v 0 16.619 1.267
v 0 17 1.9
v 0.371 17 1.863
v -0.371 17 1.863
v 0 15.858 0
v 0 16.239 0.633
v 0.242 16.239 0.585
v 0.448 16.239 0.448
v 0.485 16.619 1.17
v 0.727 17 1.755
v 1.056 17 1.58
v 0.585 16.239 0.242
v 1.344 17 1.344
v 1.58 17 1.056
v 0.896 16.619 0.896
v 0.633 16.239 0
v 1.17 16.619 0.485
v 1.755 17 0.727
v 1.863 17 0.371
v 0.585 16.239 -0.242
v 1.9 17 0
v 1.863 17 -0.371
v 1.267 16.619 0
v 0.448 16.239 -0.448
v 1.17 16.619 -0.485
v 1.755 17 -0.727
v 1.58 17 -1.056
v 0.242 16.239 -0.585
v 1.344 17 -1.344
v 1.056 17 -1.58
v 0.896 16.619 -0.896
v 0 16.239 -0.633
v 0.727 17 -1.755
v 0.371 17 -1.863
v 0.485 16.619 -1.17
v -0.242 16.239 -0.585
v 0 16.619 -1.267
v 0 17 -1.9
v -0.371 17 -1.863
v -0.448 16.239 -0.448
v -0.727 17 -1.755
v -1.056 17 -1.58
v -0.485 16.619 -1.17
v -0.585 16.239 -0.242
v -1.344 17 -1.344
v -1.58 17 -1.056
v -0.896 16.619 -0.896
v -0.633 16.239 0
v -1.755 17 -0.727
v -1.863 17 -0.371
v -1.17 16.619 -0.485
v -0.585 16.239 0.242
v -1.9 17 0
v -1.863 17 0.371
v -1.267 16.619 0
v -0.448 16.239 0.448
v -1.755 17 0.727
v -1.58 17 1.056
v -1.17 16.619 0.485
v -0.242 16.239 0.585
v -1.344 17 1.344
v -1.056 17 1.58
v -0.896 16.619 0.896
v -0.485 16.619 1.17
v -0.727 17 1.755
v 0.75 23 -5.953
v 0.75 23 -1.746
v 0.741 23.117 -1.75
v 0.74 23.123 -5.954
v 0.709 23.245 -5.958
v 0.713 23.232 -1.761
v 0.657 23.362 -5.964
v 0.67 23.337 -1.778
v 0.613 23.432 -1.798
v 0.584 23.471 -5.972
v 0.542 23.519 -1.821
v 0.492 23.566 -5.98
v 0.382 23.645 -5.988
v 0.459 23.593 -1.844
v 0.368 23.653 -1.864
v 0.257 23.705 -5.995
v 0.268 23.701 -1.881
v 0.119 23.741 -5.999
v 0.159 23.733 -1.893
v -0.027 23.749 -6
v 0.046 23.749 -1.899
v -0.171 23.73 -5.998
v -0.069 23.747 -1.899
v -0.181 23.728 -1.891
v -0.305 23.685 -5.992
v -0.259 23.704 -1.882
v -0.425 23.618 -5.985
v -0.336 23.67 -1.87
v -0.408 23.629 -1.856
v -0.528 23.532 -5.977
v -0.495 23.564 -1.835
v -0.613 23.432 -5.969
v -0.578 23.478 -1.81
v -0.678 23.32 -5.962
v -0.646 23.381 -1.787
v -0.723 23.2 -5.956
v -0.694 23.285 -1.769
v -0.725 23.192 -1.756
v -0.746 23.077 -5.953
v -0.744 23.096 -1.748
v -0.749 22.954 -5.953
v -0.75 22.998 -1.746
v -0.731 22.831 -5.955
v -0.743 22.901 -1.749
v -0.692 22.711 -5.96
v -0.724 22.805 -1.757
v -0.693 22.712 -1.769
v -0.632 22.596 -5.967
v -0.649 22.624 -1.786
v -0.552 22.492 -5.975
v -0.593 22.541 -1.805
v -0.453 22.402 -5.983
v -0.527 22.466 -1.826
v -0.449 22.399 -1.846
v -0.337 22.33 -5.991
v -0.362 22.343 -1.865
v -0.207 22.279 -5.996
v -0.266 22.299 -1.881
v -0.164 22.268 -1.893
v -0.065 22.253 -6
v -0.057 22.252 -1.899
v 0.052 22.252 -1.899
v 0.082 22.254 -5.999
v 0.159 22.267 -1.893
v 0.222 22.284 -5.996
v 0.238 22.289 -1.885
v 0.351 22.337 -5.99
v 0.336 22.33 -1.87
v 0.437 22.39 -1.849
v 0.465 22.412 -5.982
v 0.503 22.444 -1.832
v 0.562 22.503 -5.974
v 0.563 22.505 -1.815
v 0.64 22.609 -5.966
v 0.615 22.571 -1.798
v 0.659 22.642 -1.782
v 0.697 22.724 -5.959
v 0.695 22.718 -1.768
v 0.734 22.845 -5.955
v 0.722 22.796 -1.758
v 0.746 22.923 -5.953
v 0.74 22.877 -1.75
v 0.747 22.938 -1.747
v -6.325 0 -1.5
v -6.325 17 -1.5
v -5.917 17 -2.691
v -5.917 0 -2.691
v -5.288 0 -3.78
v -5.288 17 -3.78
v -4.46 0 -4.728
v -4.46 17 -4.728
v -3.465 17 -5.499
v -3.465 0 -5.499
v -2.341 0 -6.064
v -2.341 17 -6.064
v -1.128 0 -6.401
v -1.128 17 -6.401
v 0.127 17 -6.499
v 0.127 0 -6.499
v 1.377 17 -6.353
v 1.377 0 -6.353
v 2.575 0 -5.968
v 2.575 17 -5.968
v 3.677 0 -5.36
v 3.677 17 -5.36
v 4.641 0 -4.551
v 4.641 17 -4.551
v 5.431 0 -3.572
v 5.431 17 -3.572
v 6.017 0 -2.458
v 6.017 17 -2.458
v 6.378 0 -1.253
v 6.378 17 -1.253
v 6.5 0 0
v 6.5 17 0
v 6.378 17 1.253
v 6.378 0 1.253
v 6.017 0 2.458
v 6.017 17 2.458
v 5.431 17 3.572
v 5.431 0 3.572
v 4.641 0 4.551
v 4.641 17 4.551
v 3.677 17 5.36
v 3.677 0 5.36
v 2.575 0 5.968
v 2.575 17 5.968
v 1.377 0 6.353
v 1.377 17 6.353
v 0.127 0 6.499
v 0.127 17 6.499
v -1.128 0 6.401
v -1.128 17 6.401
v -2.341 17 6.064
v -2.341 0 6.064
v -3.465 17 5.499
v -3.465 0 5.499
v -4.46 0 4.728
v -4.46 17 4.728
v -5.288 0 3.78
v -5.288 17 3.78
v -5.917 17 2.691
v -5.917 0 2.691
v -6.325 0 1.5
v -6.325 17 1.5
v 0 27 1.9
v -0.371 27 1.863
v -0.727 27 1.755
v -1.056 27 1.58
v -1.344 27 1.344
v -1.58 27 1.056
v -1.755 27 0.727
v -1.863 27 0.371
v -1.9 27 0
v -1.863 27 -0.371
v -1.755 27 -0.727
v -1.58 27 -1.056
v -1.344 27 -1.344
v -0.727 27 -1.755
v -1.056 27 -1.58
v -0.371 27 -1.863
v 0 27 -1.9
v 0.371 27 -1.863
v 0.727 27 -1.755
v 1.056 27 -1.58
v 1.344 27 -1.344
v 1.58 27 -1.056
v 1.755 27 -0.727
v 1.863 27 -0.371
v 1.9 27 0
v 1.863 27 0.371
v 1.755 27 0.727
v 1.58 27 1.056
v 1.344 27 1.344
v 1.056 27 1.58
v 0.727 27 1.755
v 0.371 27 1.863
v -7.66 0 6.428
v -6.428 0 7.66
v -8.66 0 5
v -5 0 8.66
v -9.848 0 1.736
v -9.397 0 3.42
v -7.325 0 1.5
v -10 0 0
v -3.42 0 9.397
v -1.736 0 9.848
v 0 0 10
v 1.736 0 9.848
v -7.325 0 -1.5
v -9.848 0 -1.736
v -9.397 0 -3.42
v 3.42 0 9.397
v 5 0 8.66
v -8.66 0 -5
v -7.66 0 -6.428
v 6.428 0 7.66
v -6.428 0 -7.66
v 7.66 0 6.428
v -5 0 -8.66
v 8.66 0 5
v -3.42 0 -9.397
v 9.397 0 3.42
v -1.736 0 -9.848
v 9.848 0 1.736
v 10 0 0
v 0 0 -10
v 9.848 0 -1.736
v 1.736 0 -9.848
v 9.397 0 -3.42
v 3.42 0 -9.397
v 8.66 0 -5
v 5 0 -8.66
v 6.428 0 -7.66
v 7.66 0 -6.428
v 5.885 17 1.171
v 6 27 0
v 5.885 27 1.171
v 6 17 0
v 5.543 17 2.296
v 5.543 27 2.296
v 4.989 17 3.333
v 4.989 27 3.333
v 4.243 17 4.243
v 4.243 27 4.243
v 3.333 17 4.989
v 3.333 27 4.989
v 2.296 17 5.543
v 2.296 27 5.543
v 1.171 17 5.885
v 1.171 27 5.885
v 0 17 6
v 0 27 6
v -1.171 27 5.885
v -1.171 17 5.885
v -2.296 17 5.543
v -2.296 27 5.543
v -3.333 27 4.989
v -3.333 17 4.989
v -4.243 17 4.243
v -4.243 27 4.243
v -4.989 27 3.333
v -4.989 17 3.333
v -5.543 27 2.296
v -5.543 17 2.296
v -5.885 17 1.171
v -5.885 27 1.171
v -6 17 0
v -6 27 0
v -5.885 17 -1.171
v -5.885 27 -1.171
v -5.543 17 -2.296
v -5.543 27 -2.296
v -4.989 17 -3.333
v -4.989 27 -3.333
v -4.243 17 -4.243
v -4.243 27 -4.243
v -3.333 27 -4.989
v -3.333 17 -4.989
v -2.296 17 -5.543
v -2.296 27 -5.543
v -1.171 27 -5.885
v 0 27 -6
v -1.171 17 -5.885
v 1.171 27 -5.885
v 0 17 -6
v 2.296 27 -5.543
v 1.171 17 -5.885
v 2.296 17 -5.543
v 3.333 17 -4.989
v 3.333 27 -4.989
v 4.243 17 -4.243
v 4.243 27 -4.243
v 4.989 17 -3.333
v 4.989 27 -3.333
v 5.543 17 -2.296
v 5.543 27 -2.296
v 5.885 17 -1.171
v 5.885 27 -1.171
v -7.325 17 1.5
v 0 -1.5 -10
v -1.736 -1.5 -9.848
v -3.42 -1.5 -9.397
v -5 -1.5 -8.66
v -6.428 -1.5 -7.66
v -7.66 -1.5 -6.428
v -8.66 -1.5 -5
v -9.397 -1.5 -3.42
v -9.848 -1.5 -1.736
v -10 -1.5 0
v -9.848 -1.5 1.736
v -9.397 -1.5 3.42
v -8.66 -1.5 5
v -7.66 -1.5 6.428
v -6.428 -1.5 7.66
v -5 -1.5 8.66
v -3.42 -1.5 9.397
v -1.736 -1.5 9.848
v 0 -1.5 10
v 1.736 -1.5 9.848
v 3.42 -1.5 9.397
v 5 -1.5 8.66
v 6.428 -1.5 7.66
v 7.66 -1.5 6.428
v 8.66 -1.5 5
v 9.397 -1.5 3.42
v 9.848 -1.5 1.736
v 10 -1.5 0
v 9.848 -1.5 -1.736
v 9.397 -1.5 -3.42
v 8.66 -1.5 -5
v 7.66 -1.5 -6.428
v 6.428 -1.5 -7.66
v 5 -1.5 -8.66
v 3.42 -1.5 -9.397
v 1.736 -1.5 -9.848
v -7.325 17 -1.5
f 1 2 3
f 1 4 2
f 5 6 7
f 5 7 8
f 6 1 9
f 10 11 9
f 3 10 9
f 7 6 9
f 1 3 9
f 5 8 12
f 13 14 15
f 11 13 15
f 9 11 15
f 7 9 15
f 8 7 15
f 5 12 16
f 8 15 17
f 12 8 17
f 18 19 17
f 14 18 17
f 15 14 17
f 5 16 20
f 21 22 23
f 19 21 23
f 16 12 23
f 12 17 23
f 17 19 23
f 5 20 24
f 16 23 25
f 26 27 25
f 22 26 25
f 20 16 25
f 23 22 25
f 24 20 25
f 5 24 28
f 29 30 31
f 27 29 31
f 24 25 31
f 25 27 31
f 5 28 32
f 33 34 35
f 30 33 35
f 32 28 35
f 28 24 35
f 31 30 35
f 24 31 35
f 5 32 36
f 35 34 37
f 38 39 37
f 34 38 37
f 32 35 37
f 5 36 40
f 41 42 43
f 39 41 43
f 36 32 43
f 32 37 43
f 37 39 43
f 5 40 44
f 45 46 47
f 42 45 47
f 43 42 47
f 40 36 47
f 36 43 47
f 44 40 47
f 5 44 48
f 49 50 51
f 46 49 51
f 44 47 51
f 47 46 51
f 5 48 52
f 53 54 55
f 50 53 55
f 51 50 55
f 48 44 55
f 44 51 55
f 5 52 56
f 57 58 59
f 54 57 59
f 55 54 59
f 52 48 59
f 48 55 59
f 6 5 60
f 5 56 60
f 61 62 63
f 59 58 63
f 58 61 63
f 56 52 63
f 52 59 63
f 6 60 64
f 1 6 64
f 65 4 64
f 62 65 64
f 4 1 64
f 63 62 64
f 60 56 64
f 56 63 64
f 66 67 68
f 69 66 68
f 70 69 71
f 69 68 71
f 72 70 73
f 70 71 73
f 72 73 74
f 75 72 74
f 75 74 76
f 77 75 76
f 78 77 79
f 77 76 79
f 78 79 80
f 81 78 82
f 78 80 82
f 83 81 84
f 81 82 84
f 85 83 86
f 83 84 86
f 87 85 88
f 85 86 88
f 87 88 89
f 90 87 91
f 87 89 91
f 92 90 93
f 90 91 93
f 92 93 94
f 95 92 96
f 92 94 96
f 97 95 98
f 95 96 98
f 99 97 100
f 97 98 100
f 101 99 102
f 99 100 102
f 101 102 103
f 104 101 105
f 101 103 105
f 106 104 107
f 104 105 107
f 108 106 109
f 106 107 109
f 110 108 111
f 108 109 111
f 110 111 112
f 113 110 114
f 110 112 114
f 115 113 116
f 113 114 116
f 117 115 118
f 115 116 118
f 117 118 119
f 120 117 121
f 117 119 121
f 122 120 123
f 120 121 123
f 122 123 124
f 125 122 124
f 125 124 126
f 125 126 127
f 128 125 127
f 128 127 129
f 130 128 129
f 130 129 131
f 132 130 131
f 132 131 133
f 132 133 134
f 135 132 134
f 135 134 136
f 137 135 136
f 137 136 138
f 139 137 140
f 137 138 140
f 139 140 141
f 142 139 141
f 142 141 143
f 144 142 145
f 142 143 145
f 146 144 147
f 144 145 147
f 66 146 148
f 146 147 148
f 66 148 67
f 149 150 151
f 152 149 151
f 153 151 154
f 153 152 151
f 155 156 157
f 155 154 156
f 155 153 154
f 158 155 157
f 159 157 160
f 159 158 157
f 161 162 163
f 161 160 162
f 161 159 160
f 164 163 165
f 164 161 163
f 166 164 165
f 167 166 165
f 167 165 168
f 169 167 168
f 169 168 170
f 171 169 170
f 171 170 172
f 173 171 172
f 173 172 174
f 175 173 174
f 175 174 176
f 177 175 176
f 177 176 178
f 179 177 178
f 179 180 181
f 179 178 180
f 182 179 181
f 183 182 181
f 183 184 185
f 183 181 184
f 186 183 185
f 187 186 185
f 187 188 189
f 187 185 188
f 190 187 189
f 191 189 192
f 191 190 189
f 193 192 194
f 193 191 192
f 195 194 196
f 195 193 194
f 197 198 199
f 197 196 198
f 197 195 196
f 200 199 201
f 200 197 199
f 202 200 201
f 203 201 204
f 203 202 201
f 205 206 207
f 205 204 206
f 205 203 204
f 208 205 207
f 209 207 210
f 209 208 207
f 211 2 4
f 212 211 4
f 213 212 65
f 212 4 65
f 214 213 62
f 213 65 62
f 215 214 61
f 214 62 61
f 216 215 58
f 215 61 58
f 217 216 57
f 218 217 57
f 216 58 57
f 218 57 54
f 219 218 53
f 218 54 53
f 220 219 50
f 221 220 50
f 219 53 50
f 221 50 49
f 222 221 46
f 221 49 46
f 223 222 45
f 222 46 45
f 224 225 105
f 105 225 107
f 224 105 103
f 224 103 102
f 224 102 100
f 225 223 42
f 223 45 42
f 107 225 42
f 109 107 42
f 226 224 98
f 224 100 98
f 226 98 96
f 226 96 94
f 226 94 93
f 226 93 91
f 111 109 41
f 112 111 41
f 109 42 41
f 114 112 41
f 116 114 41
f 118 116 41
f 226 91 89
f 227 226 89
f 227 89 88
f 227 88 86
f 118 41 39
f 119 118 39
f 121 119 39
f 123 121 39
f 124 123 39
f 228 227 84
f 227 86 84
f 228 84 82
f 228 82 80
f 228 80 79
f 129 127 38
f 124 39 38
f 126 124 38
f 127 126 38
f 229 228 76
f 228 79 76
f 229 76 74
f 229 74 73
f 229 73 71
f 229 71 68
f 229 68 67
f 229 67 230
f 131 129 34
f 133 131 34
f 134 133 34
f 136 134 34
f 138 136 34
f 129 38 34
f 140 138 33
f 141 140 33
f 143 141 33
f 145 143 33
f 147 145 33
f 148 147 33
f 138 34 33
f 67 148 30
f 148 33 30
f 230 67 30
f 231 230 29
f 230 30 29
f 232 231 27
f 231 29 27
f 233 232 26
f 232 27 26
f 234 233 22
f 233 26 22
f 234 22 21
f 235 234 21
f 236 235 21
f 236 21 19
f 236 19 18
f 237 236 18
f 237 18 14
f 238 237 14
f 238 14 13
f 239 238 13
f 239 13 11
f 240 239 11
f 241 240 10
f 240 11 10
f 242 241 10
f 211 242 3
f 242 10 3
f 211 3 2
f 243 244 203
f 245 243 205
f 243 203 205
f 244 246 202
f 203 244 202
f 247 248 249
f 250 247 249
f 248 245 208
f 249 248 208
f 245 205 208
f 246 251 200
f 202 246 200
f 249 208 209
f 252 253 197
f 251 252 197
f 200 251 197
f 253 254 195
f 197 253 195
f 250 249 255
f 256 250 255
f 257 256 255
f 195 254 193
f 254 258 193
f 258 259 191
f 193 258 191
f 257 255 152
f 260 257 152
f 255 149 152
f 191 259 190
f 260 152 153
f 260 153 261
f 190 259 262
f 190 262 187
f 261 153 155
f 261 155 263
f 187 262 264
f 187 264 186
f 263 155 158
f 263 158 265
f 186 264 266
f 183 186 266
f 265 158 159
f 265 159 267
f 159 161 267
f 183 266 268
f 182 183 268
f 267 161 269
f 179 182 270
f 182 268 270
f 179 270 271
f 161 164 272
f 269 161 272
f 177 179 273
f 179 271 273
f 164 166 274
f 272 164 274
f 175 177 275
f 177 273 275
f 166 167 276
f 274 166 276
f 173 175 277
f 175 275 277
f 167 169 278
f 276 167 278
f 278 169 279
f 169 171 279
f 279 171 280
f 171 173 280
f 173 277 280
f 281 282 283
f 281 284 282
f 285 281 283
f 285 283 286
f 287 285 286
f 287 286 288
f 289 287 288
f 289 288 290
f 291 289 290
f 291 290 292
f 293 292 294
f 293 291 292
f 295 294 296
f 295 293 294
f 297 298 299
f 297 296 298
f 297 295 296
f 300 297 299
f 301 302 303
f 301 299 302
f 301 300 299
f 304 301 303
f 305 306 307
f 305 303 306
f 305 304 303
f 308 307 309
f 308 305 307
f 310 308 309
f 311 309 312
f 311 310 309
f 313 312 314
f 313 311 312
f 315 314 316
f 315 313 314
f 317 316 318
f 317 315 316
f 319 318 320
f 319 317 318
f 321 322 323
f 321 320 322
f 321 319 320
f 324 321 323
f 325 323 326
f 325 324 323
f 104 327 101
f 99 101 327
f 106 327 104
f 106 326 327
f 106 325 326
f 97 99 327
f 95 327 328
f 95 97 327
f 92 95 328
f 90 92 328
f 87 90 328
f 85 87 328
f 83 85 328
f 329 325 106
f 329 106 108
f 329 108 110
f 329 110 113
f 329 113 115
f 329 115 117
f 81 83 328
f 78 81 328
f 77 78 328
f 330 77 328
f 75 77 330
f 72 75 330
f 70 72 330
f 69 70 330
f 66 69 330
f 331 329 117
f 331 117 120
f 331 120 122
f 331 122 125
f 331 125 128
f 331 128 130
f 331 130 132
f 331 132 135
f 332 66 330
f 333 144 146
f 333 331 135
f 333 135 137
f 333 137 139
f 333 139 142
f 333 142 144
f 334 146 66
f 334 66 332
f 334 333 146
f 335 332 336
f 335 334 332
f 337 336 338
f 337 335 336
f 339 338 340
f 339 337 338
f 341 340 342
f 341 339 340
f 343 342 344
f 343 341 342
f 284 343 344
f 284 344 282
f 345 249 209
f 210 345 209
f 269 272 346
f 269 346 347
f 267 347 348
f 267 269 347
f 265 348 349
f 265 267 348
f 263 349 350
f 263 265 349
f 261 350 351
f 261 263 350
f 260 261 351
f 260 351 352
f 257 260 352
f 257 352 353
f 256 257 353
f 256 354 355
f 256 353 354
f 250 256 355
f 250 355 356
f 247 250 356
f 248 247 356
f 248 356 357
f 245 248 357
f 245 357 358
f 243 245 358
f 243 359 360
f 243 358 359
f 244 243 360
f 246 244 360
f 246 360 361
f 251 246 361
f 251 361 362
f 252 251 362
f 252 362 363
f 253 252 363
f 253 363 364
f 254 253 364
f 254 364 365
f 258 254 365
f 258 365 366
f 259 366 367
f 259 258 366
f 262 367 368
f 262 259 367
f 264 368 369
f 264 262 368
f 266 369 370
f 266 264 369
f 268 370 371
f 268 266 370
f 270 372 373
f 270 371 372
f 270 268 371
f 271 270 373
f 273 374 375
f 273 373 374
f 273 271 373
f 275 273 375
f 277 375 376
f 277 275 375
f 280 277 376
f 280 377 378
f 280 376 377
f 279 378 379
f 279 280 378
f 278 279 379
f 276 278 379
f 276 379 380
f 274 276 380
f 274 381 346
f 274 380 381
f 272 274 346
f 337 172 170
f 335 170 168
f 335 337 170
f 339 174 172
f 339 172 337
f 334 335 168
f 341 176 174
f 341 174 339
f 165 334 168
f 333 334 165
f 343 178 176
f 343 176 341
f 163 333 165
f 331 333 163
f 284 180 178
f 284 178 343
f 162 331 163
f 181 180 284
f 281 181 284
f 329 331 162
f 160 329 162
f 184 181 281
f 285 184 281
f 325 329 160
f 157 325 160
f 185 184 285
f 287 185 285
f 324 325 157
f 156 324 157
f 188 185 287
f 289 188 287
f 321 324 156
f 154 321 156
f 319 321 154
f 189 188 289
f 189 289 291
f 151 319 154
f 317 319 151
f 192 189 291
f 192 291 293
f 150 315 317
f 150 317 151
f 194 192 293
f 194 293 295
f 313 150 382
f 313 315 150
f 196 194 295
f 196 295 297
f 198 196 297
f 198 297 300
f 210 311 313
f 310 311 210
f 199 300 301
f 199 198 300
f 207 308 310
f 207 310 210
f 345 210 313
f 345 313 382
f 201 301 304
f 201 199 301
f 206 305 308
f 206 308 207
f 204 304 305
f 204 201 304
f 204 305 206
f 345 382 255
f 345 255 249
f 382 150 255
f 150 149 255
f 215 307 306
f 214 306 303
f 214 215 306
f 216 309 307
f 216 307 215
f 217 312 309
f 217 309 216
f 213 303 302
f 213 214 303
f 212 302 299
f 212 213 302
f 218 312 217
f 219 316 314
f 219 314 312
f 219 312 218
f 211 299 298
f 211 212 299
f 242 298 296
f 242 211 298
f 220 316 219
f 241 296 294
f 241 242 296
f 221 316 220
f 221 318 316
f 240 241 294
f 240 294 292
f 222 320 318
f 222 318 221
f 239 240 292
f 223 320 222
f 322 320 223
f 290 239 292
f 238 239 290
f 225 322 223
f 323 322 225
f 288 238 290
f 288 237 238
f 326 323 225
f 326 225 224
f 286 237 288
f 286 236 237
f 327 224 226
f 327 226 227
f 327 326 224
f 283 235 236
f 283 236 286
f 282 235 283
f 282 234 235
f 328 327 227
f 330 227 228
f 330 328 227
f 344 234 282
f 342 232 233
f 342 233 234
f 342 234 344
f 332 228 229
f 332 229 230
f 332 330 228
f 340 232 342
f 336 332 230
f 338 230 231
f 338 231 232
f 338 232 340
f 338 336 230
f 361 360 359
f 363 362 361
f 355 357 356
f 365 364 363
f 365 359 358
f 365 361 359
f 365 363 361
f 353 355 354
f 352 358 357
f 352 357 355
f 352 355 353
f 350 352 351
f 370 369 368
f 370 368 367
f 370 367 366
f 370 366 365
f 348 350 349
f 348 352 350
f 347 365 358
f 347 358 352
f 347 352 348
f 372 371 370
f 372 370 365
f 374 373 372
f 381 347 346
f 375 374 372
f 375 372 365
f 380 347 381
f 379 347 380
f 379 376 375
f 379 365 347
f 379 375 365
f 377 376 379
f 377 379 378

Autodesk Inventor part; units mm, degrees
ref_plane "YZ Plane" through (0, 0, 0) normal (1, 0, 0) x (0, 1, 0)
ref_plane "XZ Plane" through (0, 0, 0) normal (0, 1, 0) x (-1, 0, 0)
ref_plane "XY Plane" through (0, 0, 0) normal (0, 0, 1) x (1, 0, 0)
sketch "Sketch1" plane through (0, 0, 0) normal (0, 1, 0) x (-1, 0, 0)
  circle A0 centre (0, 0) radius 6.5
  line L0 (7.3246, 1.5) -> (6.3246, 1.5)
  line L1 (6.3246, 1.5) -> (6.3246, -1.5)
  line L2 (6.3246, -1.5) -> (7.3246, -1.5)
  line L3 (7.3246, -1.5) -> (7.3246, 1.5)
  dimension "d0" = 13
  dimension "d8" = 1
  dimension "d9" = 3
extrude "Extrusion1" add sketch "Sketch1" along normal blind 17
sketch "Sketch2" plane through (0, 0, 0) normal (0, -1, 0) x (0, 0, -1)
  circle A0 centre (0, 0) radius 10
  dimension "d3" = 20
extrude "Extrusion2" add sketch "Sketch2" along normal blind 1.5
sketch "Sketch4" plane through (0, 17, 0) normal (0, 1, 0) x (1, 0, 0)
  circle A0 centre (0, 0) radius 6
  dimension "d10" = 12
extrude "Extrusion3" add sketch "Sketch4" along normal blind 10
sketch "Sketch5" plane through (0, 27, 0) normal (0, 1, 0) x (1, 0, 0)
  point P0 (0, 0)
  point P1 (0, 0)
hole "Hole1" at (0, 27, 0) direction (0, -1, 0) diameter 3.8 depth 10 tip angle 118 clearance for "Hex Head Cap Screw ISO 24017" size "M3" standard "ISO"
sketch "Sketch6" plane through (0, 0, 0) normal (0, 0, 1) x (1, 0, 0)
  circle A0 centre (0, 23) radius 0.75
  line L0 (6, 27) -> (-6, 27) projected
  line L1 (0, -7.2) -> (0, 32.7) projected
  point P0 (0, 0)
  dimension "d21" = 1.5
  dimension "d26" = 4
extrude "Extrusion4" cut sketch "Sketch6" against normal up to surface
properties part number "wheel_adapt"
